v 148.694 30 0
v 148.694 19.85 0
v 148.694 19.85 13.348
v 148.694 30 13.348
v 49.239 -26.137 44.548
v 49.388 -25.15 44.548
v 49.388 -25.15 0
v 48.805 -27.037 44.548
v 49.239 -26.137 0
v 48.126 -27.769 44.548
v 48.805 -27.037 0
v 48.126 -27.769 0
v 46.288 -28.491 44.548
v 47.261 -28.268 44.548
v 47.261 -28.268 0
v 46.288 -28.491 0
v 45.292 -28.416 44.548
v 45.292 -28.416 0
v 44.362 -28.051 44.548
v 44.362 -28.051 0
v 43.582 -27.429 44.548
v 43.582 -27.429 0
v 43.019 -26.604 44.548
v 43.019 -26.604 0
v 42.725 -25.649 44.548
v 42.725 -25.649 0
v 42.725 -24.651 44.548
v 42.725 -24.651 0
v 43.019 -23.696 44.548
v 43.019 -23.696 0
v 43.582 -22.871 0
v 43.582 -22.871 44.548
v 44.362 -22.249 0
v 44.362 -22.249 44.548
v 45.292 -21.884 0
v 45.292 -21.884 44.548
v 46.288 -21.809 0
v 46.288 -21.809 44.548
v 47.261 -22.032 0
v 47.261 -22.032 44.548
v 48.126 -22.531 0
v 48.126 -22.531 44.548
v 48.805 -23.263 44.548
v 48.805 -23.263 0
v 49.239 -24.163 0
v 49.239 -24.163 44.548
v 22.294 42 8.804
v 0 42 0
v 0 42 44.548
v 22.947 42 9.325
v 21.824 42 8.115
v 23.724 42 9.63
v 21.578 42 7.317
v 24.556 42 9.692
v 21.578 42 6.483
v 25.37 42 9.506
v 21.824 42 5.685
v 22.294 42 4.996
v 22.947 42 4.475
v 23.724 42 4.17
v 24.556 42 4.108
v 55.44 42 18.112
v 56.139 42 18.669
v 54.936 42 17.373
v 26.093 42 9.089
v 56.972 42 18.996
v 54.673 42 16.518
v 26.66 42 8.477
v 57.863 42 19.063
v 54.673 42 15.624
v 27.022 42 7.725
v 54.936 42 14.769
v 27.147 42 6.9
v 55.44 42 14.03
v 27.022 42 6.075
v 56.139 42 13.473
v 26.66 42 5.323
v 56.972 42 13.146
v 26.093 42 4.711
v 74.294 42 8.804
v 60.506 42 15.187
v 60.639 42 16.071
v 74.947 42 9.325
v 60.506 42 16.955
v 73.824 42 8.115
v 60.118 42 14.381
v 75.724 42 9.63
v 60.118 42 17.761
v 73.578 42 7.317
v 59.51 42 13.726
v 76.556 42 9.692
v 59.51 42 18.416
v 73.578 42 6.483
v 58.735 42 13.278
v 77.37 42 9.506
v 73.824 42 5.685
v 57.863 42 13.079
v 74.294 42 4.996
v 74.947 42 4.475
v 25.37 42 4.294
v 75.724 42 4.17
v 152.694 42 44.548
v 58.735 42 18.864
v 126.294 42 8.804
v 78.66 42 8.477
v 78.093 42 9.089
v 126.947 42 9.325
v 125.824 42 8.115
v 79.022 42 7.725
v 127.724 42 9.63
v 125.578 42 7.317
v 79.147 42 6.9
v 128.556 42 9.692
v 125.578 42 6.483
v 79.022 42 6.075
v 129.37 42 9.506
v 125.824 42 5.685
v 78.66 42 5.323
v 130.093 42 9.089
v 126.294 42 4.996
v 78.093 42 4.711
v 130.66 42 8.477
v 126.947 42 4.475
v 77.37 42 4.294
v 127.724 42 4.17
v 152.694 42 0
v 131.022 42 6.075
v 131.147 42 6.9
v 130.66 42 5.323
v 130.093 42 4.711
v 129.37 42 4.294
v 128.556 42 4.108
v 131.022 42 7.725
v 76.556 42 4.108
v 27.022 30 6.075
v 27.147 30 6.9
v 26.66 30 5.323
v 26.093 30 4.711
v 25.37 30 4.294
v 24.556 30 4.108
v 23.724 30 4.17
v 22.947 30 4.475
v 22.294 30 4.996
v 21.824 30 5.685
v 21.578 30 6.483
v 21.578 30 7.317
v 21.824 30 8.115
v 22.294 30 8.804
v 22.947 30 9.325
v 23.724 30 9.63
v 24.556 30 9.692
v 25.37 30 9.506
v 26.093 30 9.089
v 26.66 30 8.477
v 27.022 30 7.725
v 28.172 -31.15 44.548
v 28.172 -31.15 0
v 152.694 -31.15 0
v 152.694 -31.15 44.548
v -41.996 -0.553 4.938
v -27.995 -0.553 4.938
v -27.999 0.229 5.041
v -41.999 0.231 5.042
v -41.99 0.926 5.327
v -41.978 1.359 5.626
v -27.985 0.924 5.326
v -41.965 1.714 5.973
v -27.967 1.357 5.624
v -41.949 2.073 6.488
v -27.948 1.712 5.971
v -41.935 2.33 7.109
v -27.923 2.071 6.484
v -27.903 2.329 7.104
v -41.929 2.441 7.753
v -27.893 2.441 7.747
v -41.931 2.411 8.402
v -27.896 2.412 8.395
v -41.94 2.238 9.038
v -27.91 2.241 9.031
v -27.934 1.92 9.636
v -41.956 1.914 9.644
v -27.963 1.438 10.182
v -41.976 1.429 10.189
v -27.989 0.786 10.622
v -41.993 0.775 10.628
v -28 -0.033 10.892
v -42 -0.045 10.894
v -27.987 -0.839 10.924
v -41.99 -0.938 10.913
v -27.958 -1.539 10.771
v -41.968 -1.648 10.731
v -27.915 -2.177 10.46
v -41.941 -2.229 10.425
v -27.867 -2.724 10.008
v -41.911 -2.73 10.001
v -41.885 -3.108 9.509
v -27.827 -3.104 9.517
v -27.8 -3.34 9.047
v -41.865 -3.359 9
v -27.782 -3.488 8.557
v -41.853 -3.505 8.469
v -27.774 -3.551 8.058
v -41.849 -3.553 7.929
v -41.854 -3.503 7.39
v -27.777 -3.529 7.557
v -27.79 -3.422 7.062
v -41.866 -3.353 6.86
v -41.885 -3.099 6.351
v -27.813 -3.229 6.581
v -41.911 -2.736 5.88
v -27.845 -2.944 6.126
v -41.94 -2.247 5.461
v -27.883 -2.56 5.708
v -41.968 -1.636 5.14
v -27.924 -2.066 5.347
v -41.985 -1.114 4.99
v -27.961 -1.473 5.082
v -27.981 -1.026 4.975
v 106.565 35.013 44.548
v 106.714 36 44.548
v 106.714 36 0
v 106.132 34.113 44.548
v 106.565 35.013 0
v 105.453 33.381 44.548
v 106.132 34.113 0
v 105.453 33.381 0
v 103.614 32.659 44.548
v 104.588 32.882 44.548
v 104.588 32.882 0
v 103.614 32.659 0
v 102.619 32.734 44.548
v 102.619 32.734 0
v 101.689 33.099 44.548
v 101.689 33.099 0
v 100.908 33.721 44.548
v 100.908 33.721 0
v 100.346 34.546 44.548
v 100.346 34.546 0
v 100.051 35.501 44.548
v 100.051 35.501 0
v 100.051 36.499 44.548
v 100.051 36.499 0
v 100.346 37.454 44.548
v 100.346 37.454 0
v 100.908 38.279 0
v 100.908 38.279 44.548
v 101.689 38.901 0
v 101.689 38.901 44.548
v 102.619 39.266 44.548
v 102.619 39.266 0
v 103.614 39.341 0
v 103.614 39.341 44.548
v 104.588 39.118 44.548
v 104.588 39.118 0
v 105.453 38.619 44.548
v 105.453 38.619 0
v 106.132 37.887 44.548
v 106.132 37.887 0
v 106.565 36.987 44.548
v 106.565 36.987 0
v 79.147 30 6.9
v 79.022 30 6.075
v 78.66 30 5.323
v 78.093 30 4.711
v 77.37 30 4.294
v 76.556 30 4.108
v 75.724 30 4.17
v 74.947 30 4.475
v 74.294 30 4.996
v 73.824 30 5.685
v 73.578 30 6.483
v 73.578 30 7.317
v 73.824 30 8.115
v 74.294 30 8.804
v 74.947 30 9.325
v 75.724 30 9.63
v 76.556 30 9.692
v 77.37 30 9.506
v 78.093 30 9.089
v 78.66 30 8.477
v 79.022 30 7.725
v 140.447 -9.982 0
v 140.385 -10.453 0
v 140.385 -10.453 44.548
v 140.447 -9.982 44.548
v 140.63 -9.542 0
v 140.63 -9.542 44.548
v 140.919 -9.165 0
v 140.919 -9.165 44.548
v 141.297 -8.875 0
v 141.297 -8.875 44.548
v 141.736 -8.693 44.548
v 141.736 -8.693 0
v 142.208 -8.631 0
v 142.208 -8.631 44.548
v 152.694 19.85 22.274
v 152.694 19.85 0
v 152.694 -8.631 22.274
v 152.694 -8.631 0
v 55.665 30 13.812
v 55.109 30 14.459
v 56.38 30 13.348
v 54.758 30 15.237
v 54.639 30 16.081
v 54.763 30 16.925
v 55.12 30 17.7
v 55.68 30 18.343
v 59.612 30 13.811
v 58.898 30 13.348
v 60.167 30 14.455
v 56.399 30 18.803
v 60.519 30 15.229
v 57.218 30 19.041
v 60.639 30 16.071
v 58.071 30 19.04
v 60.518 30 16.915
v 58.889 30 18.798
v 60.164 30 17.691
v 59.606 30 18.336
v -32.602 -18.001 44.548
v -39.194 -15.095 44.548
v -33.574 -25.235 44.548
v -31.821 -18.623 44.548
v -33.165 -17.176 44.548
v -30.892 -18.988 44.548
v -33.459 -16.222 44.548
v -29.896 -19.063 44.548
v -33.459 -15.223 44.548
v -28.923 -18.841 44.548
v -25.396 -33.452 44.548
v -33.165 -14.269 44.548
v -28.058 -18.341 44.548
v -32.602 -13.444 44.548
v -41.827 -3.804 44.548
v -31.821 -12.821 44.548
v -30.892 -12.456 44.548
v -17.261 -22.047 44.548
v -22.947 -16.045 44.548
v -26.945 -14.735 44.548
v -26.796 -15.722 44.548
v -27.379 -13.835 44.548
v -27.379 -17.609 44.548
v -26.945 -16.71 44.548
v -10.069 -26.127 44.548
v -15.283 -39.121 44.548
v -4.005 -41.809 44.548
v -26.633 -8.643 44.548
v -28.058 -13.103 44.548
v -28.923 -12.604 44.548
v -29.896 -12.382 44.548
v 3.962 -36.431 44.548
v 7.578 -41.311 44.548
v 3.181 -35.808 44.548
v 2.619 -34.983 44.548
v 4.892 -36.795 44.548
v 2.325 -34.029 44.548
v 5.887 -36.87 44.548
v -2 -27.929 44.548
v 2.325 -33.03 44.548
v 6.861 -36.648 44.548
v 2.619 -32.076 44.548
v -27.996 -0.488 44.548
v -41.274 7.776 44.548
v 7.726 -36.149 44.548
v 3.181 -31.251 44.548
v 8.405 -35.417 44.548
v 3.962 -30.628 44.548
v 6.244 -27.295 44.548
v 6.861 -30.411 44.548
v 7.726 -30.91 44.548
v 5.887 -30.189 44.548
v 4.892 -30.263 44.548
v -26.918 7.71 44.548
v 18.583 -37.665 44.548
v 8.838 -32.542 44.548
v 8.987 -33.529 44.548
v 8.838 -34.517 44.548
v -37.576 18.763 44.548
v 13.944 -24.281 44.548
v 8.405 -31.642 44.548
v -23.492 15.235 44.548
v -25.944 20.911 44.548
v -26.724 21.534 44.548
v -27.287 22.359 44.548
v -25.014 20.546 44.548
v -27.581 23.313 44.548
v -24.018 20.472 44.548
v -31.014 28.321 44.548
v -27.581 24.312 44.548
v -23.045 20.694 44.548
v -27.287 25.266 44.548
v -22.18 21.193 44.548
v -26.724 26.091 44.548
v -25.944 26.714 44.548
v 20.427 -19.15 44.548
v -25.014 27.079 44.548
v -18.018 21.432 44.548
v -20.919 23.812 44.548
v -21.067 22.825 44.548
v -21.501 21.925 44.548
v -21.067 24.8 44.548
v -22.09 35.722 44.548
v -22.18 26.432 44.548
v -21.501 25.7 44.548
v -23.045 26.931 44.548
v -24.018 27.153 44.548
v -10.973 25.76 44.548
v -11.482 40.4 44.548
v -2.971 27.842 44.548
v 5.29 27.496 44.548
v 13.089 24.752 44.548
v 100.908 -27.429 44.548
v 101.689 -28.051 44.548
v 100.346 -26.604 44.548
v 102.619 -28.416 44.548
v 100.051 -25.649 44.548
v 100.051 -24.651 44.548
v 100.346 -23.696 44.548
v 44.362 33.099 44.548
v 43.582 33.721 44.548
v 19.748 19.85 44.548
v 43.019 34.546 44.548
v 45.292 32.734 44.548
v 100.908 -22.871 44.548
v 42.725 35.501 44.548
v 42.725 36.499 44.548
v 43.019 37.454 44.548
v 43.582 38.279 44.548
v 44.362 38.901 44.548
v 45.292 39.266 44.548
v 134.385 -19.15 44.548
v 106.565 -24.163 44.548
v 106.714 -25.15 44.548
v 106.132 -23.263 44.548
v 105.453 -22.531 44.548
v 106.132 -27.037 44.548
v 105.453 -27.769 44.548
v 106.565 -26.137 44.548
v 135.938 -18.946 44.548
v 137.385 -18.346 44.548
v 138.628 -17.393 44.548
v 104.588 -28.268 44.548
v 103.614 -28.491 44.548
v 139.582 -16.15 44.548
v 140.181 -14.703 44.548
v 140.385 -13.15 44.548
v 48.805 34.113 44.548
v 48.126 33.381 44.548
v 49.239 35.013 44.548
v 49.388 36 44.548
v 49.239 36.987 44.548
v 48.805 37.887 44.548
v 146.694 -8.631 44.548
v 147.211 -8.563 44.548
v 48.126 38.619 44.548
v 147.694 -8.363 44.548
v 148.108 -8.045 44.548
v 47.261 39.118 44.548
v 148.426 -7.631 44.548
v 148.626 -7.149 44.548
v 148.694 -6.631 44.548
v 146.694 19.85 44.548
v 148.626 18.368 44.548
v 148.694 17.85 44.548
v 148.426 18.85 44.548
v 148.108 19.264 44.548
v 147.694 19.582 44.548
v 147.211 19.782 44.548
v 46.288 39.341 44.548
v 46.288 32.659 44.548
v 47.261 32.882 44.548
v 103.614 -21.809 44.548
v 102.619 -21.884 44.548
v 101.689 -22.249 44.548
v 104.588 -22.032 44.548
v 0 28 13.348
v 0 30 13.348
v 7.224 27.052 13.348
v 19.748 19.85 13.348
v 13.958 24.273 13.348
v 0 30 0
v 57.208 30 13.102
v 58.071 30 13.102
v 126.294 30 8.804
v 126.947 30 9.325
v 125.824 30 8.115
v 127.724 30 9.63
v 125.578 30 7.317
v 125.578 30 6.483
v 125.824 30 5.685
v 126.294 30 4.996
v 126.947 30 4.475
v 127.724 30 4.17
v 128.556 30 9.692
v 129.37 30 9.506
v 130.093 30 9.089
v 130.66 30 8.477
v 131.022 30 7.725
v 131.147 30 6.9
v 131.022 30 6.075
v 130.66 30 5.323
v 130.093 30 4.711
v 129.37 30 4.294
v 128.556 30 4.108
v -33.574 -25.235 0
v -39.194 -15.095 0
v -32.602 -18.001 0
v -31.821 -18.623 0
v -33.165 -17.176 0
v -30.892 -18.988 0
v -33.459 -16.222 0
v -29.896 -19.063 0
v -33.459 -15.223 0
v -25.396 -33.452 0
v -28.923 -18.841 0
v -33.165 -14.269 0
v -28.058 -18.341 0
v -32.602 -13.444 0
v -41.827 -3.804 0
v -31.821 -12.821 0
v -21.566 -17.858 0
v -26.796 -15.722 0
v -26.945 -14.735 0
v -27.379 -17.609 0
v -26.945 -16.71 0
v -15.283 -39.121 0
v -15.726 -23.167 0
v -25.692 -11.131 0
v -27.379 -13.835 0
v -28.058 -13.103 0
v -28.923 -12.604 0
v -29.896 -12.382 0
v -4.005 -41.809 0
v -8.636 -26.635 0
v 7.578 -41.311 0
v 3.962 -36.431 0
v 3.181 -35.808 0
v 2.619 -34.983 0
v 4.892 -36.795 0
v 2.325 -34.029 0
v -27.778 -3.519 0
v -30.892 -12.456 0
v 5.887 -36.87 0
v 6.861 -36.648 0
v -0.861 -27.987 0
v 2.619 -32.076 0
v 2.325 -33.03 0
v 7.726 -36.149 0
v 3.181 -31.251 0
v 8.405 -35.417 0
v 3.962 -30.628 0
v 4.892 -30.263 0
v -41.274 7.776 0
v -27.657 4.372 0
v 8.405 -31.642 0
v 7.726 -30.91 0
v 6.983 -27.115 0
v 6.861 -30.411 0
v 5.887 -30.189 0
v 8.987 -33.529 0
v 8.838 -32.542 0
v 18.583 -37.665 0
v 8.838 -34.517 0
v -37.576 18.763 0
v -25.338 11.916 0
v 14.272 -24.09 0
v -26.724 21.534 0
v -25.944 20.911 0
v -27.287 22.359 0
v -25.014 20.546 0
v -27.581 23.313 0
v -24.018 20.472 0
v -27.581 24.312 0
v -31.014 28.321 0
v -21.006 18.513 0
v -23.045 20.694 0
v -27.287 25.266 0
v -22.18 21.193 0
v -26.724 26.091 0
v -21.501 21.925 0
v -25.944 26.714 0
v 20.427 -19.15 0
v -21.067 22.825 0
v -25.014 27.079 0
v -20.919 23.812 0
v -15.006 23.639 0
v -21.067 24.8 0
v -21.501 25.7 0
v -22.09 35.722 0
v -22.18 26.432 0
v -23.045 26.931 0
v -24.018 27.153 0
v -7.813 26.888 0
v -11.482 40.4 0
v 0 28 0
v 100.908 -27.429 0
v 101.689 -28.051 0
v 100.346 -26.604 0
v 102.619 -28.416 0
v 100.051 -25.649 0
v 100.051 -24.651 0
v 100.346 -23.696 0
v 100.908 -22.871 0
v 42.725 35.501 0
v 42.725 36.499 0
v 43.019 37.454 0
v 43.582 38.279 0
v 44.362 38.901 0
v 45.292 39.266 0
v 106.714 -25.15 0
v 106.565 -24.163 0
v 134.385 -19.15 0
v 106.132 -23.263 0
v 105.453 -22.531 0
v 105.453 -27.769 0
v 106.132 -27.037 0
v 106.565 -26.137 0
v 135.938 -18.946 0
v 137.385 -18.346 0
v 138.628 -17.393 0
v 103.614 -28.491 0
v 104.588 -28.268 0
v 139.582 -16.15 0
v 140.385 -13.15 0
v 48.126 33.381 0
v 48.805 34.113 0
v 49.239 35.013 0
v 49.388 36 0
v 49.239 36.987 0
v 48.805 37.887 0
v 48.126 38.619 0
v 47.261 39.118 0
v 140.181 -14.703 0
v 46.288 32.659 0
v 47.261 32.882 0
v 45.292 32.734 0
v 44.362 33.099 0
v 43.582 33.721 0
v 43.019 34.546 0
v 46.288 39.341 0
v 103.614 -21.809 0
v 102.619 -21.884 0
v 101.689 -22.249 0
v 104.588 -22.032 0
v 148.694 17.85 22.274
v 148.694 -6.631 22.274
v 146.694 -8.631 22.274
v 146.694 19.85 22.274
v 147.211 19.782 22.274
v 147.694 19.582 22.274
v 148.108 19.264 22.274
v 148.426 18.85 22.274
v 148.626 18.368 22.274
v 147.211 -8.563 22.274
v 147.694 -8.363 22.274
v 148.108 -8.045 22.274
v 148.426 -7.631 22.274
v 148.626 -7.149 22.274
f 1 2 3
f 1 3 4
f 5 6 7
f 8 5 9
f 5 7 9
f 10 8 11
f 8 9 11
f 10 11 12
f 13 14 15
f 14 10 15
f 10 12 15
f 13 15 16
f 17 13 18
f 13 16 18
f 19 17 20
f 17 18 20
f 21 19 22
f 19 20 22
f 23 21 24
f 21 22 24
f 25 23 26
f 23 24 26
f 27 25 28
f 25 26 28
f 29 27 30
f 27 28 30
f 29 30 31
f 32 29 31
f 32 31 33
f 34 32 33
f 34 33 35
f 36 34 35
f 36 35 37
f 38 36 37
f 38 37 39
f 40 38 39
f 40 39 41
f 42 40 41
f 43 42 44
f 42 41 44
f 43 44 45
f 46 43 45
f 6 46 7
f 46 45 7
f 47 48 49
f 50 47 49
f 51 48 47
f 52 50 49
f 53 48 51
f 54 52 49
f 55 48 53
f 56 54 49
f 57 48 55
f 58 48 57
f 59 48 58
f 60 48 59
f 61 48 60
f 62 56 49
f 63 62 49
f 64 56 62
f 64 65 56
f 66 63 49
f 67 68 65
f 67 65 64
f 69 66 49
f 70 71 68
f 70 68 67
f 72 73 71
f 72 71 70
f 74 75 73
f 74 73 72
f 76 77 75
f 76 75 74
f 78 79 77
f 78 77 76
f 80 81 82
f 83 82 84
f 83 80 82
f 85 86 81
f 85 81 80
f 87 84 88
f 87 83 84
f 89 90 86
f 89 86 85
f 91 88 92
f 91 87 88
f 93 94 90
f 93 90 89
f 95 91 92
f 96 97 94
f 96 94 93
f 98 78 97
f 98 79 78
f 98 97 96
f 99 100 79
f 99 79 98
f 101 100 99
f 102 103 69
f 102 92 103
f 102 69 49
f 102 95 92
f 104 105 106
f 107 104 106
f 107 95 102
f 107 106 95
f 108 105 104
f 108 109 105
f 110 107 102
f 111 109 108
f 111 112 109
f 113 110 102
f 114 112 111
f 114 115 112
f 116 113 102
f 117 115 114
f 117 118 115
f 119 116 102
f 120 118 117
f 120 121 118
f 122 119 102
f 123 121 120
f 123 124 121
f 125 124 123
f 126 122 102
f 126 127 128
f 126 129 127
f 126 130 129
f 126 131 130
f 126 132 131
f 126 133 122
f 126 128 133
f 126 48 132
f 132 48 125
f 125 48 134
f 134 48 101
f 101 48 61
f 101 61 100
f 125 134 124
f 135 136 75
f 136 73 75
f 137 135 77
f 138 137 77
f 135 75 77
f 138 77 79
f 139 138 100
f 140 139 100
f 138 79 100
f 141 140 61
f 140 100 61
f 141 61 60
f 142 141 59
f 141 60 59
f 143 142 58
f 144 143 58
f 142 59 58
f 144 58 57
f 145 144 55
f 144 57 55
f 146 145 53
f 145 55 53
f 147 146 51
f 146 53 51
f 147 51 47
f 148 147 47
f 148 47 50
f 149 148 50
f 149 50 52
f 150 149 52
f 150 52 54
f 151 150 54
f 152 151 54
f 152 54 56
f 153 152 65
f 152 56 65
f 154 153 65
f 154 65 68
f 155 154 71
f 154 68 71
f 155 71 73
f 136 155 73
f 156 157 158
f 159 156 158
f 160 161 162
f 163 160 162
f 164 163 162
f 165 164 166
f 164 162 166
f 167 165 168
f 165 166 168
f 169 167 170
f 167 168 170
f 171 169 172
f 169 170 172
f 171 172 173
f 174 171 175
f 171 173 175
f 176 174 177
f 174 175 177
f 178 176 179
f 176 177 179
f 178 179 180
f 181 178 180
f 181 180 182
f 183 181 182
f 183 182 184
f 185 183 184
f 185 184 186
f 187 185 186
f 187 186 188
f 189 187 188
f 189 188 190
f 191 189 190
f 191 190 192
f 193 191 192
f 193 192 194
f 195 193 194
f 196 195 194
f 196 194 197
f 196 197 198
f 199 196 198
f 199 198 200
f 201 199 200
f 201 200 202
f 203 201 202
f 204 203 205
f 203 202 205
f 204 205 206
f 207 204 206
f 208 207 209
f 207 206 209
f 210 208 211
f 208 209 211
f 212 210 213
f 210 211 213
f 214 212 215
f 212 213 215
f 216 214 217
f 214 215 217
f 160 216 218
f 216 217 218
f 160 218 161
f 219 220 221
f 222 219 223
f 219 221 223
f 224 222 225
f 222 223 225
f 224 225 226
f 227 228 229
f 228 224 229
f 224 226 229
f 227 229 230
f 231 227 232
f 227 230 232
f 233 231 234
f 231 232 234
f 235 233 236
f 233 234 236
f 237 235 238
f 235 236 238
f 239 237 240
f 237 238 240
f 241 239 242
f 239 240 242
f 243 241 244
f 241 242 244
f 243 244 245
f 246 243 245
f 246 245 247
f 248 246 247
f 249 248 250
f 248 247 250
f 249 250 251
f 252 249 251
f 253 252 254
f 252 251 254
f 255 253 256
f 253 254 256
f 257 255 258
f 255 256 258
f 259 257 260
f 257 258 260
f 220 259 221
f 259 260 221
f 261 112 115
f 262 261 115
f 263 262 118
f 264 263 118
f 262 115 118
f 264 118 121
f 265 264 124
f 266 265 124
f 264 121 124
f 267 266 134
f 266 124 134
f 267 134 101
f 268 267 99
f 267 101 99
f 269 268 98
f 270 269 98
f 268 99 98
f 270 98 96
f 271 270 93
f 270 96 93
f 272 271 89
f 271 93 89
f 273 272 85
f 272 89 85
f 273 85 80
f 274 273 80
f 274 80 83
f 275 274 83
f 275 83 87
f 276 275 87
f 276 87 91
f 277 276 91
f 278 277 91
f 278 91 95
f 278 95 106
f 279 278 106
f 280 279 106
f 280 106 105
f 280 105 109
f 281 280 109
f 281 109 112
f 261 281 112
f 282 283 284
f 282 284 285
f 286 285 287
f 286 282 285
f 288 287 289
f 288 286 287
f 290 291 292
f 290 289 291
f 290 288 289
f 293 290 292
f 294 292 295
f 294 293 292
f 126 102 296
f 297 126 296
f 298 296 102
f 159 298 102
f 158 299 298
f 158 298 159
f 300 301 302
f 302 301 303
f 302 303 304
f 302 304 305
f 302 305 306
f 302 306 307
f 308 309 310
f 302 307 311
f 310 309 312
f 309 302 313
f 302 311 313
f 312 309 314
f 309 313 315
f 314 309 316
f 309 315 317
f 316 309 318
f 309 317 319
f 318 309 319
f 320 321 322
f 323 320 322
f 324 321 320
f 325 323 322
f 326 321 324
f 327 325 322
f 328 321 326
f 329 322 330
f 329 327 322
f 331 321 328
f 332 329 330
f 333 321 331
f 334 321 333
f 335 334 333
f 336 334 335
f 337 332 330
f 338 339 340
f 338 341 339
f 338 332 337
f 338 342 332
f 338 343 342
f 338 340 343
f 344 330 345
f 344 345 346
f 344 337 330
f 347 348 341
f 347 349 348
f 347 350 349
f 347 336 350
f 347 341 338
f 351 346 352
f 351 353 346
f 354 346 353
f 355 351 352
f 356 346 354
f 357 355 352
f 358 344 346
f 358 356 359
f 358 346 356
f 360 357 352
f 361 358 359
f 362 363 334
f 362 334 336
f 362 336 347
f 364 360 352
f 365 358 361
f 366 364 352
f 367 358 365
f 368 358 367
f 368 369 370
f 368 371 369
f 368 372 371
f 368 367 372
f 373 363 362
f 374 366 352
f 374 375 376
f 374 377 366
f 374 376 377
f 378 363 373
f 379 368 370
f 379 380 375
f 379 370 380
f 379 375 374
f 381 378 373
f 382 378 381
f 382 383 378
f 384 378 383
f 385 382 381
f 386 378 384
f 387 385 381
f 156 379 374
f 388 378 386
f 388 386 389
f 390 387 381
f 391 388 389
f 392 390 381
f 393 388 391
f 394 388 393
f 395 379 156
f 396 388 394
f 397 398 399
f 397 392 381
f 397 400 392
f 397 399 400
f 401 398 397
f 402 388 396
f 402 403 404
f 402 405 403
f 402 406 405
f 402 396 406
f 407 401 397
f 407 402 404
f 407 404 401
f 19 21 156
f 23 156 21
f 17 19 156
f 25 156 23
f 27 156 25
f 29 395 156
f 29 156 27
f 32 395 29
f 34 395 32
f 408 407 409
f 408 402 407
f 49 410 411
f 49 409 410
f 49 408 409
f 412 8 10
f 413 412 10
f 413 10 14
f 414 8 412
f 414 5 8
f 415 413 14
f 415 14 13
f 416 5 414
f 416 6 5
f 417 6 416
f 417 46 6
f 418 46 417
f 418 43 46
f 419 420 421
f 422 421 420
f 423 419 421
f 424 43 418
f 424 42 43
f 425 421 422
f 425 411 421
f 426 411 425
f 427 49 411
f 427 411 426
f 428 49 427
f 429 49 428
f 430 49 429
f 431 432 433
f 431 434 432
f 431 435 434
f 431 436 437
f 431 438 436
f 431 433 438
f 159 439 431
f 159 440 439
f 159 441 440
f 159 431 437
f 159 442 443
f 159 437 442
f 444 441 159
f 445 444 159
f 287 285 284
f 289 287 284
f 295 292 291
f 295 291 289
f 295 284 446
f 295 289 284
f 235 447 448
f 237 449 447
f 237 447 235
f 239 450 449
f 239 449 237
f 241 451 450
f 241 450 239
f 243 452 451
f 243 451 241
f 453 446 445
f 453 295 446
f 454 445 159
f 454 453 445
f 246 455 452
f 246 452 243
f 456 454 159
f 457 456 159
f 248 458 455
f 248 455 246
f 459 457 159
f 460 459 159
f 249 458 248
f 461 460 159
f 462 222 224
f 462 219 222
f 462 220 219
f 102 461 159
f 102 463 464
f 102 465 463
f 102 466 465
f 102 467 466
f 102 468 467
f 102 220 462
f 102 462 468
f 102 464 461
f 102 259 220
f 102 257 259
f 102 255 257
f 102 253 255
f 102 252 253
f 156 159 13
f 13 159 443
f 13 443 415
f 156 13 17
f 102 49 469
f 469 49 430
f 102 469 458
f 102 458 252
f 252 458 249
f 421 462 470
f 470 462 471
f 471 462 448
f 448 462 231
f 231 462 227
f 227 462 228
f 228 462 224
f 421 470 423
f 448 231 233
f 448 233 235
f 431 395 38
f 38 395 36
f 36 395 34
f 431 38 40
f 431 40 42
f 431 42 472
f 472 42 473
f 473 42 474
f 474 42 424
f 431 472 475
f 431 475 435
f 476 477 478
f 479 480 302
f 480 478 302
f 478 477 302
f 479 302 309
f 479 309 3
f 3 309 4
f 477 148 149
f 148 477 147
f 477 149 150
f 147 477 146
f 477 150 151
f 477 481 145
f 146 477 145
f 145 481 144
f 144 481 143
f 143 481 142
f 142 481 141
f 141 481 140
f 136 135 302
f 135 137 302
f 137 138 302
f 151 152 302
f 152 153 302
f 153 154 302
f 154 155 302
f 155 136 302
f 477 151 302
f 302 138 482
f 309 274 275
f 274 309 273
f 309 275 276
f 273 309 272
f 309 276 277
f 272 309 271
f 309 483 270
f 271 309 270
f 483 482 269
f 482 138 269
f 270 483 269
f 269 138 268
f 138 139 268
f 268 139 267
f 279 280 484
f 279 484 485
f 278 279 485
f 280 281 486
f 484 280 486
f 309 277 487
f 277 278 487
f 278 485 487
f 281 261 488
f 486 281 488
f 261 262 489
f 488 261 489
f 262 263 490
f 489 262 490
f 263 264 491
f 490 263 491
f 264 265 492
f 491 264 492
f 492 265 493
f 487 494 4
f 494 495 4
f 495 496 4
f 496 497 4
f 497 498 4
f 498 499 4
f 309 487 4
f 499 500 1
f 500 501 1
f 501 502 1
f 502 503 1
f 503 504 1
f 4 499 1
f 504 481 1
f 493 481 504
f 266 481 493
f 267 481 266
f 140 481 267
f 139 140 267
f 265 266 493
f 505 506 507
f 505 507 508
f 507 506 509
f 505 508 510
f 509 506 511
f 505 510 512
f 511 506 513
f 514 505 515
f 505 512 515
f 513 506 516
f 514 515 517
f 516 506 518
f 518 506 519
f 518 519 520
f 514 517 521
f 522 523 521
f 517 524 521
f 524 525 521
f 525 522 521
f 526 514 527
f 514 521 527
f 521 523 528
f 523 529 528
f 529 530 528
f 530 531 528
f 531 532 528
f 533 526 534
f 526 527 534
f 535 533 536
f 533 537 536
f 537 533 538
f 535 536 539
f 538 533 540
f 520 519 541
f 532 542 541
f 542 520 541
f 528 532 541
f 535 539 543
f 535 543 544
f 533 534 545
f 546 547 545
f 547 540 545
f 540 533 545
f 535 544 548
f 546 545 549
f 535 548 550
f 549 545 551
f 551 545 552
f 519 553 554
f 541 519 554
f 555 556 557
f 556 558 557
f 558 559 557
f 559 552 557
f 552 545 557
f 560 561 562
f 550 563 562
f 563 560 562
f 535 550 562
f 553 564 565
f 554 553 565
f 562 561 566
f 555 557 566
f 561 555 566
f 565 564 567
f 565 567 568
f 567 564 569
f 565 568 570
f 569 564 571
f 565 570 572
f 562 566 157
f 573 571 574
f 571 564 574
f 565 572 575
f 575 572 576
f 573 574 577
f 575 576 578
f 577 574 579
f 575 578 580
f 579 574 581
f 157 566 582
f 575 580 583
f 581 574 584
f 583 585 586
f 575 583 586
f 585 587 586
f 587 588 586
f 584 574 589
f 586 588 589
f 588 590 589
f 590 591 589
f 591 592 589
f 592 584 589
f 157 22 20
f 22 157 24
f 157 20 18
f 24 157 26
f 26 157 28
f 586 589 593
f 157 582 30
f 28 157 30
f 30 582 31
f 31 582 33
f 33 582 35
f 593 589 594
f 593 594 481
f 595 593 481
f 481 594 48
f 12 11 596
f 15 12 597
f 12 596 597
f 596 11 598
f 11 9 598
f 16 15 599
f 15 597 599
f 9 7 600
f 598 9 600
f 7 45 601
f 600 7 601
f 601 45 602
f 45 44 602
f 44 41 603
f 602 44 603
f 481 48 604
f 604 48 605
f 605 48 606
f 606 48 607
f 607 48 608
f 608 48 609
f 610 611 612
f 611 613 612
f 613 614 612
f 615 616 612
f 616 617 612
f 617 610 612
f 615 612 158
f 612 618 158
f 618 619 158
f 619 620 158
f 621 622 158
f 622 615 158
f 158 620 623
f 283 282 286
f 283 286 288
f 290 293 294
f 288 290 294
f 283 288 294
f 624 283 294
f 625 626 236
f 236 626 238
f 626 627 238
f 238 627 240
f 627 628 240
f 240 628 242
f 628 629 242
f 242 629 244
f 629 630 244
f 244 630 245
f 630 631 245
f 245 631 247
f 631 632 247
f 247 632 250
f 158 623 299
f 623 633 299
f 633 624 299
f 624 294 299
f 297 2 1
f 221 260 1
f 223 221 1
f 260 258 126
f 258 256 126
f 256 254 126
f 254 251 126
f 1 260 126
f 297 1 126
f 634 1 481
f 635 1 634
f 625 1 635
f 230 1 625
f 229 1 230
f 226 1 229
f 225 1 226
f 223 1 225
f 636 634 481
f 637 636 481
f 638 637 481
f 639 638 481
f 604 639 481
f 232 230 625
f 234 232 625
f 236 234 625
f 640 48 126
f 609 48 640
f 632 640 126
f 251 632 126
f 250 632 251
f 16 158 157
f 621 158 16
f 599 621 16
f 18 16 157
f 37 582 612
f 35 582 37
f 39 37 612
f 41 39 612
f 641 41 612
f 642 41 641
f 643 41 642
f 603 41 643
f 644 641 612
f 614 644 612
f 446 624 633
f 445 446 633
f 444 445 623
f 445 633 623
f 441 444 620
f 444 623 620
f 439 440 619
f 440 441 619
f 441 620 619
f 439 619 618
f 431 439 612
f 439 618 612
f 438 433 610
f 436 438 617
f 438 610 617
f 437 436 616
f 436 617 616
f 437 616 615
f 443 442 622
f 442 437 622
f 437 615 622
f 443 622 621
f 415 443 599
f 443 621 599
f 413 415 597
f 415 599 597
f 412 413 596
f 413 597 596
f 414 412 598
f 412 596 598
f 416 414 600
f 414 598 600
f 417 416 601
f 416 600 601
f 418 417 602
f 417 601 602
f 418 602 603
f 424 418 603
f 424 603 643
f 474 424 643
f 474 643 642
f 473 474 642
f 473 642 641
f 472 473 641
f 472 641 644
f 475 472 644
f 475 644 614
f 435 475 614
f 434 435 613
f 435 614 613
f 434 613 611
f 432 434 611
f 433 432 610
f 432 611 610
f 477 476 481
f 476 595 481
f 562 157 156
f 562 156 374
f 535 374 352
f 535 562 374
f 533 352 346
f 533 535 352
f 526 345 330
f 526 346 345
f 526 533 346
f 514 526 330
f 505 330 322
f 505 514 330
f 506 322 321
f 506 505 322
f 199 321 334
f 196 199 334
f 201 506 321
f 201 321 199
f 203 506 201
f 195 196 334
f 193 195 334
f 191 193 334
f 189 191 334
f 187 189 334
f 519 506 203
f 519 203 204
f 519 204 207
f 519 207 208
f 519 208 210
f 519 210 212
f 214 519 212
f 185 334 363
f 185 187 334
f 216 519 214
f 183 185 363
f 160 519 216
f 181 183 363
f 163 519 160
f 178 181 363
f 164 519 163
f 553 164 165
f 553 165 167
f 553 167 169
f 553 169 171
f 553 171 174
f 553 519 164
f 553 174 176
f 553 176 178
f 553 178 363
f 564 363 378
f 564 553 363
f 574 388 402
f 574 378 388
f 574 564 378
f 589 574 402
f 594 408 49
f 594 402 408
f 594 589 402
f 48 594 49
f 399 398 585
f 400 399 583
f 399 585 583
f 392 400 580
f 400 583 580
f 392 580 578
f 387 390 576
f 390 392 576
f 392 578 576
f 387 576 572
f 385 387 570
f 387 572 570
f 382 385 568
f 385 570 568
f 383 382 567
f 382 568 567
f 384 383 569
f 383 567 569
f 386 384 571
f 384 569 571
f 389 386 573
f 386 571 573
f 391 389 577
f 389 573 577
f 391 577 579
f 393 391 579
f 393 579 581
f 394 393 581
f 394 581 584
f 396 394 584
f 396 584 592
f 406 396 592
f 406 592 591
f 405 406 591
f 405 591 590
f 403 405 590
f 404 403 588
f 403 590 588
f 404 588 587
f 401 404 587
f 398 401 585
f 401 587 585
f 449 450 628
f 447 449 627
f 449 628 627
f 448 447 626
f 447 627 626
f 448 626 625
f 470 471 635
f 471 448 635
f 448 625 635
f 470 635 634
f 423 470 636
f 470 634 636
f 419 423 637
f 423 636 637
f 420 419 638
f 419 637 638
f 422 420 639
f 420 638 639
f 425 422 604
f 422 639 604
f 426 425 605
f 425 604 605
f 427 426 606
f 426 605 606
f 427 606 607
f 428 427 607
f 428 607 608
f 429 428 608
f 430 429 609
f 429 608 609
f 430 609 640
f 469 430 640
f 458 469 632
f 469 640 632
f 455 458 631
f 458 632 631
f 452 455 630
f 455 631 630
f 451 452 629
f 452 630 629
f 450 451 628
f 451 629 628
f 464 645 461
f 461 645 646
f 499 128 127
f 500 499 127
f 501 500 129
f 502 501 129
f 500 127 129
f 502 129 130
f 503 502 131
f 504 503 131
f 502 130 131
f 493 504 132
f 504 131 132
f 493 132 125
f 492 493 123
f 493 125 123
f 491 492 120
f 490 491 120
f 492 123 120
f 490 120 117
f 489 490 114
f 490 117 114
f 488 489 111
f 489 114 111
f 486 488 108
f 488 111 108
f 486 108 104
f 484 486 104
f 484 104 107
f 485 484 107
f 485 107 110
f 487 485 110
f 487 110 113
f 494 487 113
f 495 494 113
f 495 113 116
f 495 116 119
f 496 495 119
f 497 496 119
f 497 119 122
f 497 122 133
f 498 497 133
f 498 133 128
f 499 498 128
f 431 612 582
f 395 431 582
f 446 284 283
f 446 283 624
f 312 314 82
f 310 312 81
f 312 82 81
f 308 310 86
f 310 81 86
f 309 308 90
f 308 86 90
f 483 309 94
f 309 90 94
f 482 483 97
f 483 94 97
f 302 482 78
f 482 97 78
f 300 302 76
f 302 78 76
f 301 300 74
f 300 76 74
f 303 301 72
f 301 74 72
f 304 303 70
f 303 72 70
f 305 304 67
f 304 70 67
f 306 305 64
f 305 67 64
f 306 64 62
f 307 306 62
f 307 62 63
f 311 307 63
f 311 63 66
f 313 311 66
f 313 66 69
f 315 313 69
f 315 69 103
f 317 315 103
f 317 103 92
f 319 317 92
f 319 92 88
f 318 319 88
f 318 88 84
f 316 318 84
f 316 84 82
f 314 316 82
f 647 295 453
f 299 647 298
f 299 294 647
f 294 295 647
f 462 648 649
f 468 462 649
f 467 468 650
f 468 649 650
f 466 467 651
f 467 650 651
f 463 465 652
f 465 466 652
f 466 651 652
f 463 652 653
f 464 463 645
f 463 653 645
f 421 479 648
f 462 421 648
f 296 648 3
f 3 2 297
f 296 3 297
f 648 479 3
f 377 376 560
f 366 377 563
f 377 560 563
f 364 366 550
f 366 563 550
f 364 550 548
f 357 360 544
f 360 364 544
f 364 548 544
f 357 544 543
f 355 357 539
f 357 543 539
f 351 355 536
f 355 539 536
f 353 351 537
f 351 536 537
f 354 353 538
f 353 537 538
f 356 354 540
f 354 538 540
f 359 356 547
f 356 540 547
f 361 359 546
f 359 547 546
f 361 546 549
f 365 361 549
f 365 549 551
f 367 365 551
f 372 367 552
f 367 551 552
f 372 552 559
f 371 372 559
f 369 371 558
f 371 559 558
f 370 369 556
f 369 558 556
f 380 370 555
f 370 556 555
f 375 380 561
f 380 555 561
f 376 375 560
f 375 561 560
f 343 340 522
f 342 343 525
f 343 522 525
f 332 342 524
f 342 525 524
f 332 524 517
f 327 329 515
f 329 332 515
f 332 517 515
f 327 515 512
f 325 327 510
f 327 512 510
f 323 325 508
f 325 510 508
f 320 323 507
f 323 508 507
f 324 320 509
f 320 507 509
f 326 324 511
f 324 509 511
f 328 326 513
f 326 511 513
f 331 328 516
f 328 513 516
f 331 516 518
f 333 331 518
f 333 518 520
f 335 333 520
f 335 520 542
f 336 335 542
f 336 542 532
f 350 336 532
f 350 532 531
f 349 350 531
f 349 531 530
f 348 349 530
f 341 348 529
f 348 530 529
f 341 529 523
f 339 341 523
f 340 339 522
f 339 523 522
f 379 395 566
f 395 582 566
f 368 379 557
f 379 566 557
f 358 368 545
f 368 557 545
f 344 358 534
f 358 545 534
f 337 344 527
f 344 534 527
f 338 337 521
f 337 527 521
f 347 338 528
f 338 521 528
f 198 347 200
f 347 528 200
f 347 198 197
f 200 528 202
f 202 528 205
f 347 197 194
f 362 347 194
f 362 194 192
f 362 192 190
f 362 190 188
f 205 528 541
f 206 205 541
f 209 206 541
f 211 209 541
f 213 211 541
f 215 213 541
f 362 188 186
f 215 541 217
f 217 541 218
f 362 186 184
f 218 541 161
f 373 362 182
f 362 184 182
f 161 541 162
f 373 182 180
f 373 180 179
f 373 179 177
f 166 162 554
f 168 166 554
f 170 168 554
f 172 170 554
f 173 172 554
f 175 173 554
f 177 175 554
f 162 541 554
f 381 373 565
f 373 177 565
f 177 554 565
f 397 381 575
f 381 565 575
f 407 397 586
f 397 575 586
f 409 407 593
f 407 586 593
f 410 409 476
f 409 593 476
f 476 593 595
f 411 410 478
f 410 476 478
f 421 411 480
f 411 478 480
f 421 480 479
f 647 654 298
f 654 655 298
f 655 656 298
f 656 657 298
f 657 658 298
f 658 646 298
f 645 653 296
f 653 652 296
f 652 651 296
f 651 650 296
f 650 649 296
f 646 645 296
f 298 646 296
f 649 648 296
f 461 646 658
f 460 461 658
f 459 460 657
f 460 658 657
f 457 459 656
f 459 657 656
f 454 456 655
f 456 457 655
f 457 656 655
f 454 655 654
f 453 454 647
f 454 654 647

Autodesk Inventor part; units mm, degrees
sketch "Sketch1" plane through (0, 0, 0) normal (0, 0, 1) x (1, 0, 0)
  circle A0 centre (0, 0) radius 11.1125 construction
  line L0 (104.364, -18.65) -> (70.364, -18.65) construction
  line L1 (104.364, 18.65) -> (70.364, 18.65) construction
  line L2 (23.9529, -7.067) -> (23.9529, 14.933) construction
  arc A1 (-39, 0) -> (23.4665, -31.15) centre (0, 0) ccw construction
  line L3 (50.614, 19.35) -> (60.114, 19.35) construction
  line L4 (50.614, 19.85) -> (60.114, 19.85)
  line L5 (60.114, -18.65) -> (50.614, -18.65) construction
  arc A2 (19.7478, 19.85) -> (20.4274, -19.15) centre (0, 0) ccw
  line L6 (0, 42) -> (171.45, 42)
  line L7 (-238.861, -48) -> (171.45, -48) construction
  line L8 (-39, 0) -> (-42, 0) construction
  arc A3 (0, 42) -> (28.1723, -31.15) centre (0, 0) ccw
  circle A4 centre (0, 0) radius 14.224
  line L9 (171.45, 42) -> (171.45, -31.15)
  line L10 (19.7478, 19.85) -> (152.6937, 19.85)
  line L11 (152.6937, -19.15) -> (20.4274, -19.15)
  line L12 (23.4665, -31.15) -> (171.45, -31.15)
  line L13 (0, 28) -> (0, 30)
  line L14 (0, 30) -> (117.475, 30)
  line L15 (142.2077, -8.6311) -> (152.6937, -8.6311)
  line L16 (117.475, 30) -> (117.475, 19.85) construction
  line L17 (117.475, -19.15) -> (117.475, -31.15)
  line L18 (140.3854, -10.4534) -> (140.3854, -13.15)
  line L19 (148.6937, 19.85) -> (148.6937, -6.6311)
  line L20 (117.475, 30) -> (171.45, 30) construction
  line L21 (-34.4683, 6.0777) -> (0, 0) construction
  line L22 (-22.4976, -26.8116) -> (0, 0) construction
  line L23 (0, 0) -> (11.9707, -32.8892) construction
  circle A5 centre (0, 0) radius 34 construction
  line L24 (117.475, 19.85) -> (148.6937, 19.85)
  line L25 (148.6937, 19.85) -> (148.6937, 30)
  line L26 (152.6937, 30) -> (117.475, 30)
  line L27 (117.475, 30) -> (117.475, 19.85) construction
  line L28 (34.114, 20.2591) -> (34.114, 32) construction
  line L29 (65.364, 20.2591) -> (65.364, 32) construction
  line L30 (33.864, 19.85) -> (33.864, 32) construction
  line L31 (65.614, 19.85) -> (65.614, 32) construction
  line L32 (22.4976, 36) -> (171.45, 36) construction
  line L33 (171.45, -25.15) -> (28.0371, -25.15) construction
  circle A6 centre (-24.2686, 23.8125) radius 3.35
  circle A7 centre (-30.1464, -15.7223) radius 3.35
  circle A8 centre (5.6371, -33.5294) radius 3.35
  circle A9 centre (33.6303, -5) radius 3.35
  circle A10 centre (15.1476, 30.4393) radius 3.35
  circle A11 centre (46.0375, 36) radius 3.35
  circle A12 centre (46.0375, -25.15) radius 3.35
  circle A13 centre (136.0375, 36) radius 3.35
  circle A14 centre (136.0375, -25.15) radius 3.35
  arc A15 (146.6937, -8.6311) -> (148.6937, -6.6311) centre (146.6937, -6.6311) ccw
  arc A16 (142.2077, -8.6311) -> (140.3854, -10.4534) centre (142.2077, -10.4534) ccw
  arc A17 (148.6937, 28) -> (146.6937, 30) centre (146.6937, 28) ccw
  line L34 (152.6937, 42) -> (152.6937, -31.15)
  line L35 (148.6937, 11.5374) -> (171.45, 11.5374)
  line L36 (171.45, 11.5374) -> (171.45, -8.6311)
  line L37 (171.45, -8.6311) -> (152.6937, -8.6311)
  line L38 (148.6937, -8.6435) -> (148.6937, 11.5374)
  circle A18 centre (103.364, 36) radius 3.35
  circle A19 centre (103.364, -25.15) radius 3.35
  line L39 (140.3854, -10.4534) -> (140.3854, -0.553)
  line L40 (142.3854, 1.447) -> (148.6937, 1.447)
  arc A20 (142.3854, 1.447) -> (140.3854, -0.553) centre (142.3854, -0.553) ccw
  arc A21 (134.3854, -19.15) -> (140.3854, -13.15) centre (134.3854, -13.15) ccw
  line L41 (140.747, -6.35) -> (140.747, 7.9375) construction
  arc A22 (148.6937, 17.85) -> (146.6937, 19.85) centre (146.6937, 17.85) ccw
  arc A23 (146.6937, 19.85) -> (148.6937, 21.85) centre (146.6937, 21.85) ccw
  point P0 (171.45, -22)
  point P1 (140.3854, -8.6311)
  point P2 (171.45, -7.65)
  point P3 (171.45, 7)
  point P4 (148.6937, -8.6311)
  point P5 (33.864, 30)
  point P6 (65.614, 30)
  point P7 (140.2077, 19.85)
  point P8 (148.6937, 17.7587)
  point P9 (152.6937, 11.5374)
  point P10 (152.6937, -8.6435)
  point P11 (148.6937, -8.6311)
  dimension "d38" = 68
  dimension "d0" = 78
  dimension "d4" = 0.5
  dimension "d6" = 56
  dimension "d8" = 90
  dimension "d9" = 28.448
  dimension "d12" = 12
  dimension "d23" = 12
  dimension "d24" = 0.5
  dimension "d25" = 38
  dimension "d27" = 42
  dimension "d33" = 80
  dimension "d36" = 39
  dimension "d37" = 28
  dimension "d39" = 6
  dimension "d49" = 0.25
  dimension "d50" = 0.25
  dimension "d55" = 6
  dimension "d56" = 6.7
  dimension "d59" = 360
  dimension "d62" = 6.7
  dimension "d65" = 90
  dimension "d70" = 171.45
  dimension "d84" = 2
  dimension "d92" = 4
  dimension "d102" = 2
  dimension "d111" = 6
  dimension "d116" = 4
  dimension "d117" = 2
extrude "Extrusion1" add sketch "Sketch1" along normal blind 28.448 contours A2 L11 L17 L12 A3 L6 L34 L26 L14 A10 L13 | L25 L26 L34 L10 | L11 L34 L12 L17 | A10 L14 | A21 L18 A16 L15 L34 L11 | A13 | A14 picked at (15.3429, 31.3449)
extrude "Extrusion2" add sketch "Sketch1" along normal blind 16.1 from surface at 28.448 contours L10 A2 L13 L14 A10 L26 A17 L25 A23 L4 | A2 L11 L17 L12 A3 L6 L34 L26 L14 A10 L13 | A23 L25 L10 | L25 L26 L34 L10 | L11 L34 L12 L17 | A10 L14 | L14 A10 | A17 L26 L25 | A21 L18 A16 L15 L34 L11 | A13 | A14
sketch "Sketch2" plane through (0, 42, 0) normal (0, 1, 0) x (1, 0, 0)
  circle A0 centre (24.3468, -37.648) radius 2.8
  line L0 (171.45, -43.548) -> (0, -43.548) construction
  line L1 (152.6937, 0) -> (0, 0) projected
  line L2 (0, 0) -> (0, -44.548) projected
  line L3 (0, -44.548) -> (152.6937, -44.548) projected
  line L4 (152.6937, 0) -> (152.6937, -44.548) projected
  circle A1 centre (76.3468, -37.648) radius 2.8
  circle A2 centre (128.3468, -37.648) radius 2.8
  line L5 (152.6937, 0) -> (152.6937, -44.548) construction
  line L6 (152.6937, -22.274) -> (0, -22.274) construction
  line L7 (0, 0) -> (0, -28.448) construction
  circle A3 centre (24.3468, -6.9) radius 2.8
  circle A4 centre (76.3468, -6.9) radius 2.8
  circle A5 centre (128.3468, -6.9) radius 2.8
  circle A6 centre (57.6393, -16.071) radius 3
  dimension "d73" = 5.6
  dimension "d93" = 24.3468
  dimension "d94" = 152.6937
  dimension "d97" = 52
  dimension "d108" = 6.9
extrude "Extrusion4" cut sketch "Sketch2" against normal blind 15.1 contours A3 | A4 | A5 | A6
ref_plane "Work Plane1" through (0, 0, 12) normal (0, 0, -1) x (-1, 0, 0)
sketch "Sketch6" plane through (152.6937, -31.15, 0) normal (1, 0, 0) x (0, 0, -1)
  line L0 (0, 30.597) -> (-28.448, 30.597)
  circle A0 centre (-7.9375, 30.597) radius 3
  dimension "d104" = 6
ref_plane "Work Plane2" through (-23.5188, -31.15, 0) normal (1, 0, 0) x (0, 0, -1)
extrude "Extrusion6" cut sketch "Sketch6" against normal blind 30 from surface at -176.2125
extrude "Extrusion7" add sketch "Sketch1" against normal blind 15.1 from surface at 28.448 contours L10 A2 L13 L14 A10 L26 A17 L25 A23 L4 | A23 L25 L10 | L14 A10 | A17 L26 L25 picked at (15.3464, 28.8029)
ref_plane "Work Plane3" through (0, 0, 22.274) normal (0, 0, -1) x (-1, 0, 0)
extrude "Extrusion8" add sketch "Sketch1" along normal up to surface (22.274 mm away) from surface at 22.274 contours L10 L19 A22 | L25 L26 L34 L10 | L10 L34 L35 L19 | L35 L34 L15 L38 L19 | A17 L26 L25 | L38 L15 A15
equation "\"d12\" = d23"
equation "\"d10\" = d9"
properties part number "Mech Panel v7 infill_01"
